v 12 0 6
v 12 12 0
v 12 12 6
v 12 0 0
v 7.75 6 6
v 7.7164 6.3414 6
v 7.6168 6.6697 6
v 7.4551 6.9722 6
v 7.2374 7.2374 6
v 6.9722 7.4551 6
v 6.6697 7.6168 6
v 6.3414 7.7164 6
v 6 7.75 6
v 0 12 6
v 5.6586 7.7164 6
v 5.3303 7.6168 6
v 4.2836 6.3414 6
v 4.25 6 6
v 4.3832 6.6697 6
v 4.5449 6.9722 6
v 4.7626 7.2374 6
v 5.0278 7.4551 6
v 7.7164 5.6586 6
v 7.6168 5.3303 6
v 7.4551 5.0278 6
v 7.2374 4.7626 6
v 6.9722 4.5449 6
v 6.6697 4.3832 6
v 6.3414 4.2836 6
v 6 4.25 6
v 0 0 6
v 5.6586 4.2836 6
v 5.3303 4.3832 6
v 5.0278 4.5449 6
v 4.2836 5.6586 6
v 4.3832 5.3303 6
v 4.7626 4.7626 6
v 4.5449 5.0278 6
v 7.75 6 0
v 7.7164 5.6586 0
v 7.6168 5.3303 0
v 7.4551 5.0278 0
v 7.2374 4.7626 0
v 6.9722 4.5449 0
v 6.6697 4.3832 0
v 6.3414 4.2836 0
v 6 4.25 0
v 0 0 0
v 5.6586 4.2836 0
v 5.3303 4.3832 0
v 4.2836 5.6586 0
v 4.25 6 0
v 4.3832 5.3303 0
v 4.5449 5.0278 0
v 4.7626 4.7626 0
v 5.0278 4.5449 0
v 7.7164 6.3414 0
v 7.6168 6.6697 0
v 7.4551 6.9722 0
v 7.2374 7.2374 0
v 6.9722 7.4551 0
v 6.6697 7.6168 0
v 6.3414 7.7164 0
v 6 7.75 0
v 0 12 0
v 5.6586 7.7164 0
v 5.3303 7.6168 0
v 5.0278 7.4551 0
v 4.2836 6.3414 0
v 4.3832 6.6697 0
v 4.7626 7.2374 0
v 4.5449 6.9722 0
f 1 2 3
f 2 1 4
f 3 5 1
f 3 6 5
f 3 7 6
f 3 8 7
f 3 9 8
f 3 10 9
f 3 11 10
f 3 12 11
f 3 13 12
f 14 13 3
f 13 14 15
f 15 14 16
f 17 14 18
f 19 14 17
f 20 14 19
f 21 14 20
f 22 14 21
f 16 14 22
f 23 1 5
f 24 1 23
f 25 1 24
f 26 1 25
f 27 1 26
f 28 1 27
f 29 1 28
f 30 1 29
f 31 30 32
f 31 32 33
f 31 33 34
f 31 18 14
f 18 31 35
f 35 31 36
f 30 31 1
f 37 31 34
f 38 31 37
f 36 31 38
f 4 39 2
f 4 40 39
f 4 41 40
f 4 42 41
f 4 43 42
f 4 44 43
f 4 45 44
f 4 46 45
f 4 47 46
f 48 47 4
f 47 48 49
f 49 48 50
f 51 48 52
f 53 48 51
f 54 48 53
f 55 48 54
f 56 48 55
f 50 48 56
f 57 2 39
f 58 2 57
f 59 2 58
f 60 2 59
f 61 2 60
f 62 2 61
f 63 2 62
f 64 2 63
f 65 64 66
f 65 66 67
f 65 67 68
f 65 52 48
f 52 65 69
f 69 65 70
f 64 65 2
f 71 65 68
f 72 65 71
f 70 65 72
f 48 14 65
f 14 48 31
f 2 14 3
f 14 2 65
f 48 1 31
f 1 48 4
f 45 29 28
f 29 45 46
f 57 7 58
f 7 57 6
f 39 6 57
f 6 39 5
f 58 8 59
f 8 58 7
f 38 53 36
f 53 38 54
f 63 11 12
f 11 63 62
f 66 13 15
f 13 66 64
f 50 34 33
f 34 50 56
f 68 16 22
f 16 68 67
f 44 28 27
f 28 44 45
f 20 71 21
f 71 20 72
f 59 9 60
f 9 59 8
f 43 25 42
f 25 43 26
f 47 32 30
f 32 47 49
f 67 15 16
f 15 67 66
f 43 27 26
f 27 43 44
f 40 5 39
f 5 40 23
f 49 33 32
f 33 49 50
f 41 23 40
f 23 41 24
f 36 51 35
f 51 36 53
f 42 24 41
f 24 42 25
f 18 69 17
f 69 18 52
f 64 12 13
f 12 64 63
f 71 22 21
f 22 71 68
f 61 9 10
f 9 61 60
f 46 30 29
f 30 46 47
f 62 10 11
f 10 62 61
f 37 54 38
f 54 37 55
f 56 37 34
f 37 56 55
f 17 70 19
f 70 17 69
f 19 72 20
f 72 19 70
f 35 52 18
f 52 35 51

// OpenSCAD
$fn = 32;

// ----------------------------------------------------------------------
// Micro pad: drilled pad, 5-20 mm class
// ----------------------------------------------------------------------

// --- parameters (mm) ---
pad_l = 12;               // pad length, X
pad_w = 12;               // pad width, Y
pad_t = 6;                // pad thickness, Z
hole_d = 3.5;             // through hole diameter

difference() {
  cube([pad_l, pad_w, pad_t]);
  translate([pad_l / 2, pad_w / 2, -1])
    cylinder(h = pad_t + 2, d = hole_d);
}
